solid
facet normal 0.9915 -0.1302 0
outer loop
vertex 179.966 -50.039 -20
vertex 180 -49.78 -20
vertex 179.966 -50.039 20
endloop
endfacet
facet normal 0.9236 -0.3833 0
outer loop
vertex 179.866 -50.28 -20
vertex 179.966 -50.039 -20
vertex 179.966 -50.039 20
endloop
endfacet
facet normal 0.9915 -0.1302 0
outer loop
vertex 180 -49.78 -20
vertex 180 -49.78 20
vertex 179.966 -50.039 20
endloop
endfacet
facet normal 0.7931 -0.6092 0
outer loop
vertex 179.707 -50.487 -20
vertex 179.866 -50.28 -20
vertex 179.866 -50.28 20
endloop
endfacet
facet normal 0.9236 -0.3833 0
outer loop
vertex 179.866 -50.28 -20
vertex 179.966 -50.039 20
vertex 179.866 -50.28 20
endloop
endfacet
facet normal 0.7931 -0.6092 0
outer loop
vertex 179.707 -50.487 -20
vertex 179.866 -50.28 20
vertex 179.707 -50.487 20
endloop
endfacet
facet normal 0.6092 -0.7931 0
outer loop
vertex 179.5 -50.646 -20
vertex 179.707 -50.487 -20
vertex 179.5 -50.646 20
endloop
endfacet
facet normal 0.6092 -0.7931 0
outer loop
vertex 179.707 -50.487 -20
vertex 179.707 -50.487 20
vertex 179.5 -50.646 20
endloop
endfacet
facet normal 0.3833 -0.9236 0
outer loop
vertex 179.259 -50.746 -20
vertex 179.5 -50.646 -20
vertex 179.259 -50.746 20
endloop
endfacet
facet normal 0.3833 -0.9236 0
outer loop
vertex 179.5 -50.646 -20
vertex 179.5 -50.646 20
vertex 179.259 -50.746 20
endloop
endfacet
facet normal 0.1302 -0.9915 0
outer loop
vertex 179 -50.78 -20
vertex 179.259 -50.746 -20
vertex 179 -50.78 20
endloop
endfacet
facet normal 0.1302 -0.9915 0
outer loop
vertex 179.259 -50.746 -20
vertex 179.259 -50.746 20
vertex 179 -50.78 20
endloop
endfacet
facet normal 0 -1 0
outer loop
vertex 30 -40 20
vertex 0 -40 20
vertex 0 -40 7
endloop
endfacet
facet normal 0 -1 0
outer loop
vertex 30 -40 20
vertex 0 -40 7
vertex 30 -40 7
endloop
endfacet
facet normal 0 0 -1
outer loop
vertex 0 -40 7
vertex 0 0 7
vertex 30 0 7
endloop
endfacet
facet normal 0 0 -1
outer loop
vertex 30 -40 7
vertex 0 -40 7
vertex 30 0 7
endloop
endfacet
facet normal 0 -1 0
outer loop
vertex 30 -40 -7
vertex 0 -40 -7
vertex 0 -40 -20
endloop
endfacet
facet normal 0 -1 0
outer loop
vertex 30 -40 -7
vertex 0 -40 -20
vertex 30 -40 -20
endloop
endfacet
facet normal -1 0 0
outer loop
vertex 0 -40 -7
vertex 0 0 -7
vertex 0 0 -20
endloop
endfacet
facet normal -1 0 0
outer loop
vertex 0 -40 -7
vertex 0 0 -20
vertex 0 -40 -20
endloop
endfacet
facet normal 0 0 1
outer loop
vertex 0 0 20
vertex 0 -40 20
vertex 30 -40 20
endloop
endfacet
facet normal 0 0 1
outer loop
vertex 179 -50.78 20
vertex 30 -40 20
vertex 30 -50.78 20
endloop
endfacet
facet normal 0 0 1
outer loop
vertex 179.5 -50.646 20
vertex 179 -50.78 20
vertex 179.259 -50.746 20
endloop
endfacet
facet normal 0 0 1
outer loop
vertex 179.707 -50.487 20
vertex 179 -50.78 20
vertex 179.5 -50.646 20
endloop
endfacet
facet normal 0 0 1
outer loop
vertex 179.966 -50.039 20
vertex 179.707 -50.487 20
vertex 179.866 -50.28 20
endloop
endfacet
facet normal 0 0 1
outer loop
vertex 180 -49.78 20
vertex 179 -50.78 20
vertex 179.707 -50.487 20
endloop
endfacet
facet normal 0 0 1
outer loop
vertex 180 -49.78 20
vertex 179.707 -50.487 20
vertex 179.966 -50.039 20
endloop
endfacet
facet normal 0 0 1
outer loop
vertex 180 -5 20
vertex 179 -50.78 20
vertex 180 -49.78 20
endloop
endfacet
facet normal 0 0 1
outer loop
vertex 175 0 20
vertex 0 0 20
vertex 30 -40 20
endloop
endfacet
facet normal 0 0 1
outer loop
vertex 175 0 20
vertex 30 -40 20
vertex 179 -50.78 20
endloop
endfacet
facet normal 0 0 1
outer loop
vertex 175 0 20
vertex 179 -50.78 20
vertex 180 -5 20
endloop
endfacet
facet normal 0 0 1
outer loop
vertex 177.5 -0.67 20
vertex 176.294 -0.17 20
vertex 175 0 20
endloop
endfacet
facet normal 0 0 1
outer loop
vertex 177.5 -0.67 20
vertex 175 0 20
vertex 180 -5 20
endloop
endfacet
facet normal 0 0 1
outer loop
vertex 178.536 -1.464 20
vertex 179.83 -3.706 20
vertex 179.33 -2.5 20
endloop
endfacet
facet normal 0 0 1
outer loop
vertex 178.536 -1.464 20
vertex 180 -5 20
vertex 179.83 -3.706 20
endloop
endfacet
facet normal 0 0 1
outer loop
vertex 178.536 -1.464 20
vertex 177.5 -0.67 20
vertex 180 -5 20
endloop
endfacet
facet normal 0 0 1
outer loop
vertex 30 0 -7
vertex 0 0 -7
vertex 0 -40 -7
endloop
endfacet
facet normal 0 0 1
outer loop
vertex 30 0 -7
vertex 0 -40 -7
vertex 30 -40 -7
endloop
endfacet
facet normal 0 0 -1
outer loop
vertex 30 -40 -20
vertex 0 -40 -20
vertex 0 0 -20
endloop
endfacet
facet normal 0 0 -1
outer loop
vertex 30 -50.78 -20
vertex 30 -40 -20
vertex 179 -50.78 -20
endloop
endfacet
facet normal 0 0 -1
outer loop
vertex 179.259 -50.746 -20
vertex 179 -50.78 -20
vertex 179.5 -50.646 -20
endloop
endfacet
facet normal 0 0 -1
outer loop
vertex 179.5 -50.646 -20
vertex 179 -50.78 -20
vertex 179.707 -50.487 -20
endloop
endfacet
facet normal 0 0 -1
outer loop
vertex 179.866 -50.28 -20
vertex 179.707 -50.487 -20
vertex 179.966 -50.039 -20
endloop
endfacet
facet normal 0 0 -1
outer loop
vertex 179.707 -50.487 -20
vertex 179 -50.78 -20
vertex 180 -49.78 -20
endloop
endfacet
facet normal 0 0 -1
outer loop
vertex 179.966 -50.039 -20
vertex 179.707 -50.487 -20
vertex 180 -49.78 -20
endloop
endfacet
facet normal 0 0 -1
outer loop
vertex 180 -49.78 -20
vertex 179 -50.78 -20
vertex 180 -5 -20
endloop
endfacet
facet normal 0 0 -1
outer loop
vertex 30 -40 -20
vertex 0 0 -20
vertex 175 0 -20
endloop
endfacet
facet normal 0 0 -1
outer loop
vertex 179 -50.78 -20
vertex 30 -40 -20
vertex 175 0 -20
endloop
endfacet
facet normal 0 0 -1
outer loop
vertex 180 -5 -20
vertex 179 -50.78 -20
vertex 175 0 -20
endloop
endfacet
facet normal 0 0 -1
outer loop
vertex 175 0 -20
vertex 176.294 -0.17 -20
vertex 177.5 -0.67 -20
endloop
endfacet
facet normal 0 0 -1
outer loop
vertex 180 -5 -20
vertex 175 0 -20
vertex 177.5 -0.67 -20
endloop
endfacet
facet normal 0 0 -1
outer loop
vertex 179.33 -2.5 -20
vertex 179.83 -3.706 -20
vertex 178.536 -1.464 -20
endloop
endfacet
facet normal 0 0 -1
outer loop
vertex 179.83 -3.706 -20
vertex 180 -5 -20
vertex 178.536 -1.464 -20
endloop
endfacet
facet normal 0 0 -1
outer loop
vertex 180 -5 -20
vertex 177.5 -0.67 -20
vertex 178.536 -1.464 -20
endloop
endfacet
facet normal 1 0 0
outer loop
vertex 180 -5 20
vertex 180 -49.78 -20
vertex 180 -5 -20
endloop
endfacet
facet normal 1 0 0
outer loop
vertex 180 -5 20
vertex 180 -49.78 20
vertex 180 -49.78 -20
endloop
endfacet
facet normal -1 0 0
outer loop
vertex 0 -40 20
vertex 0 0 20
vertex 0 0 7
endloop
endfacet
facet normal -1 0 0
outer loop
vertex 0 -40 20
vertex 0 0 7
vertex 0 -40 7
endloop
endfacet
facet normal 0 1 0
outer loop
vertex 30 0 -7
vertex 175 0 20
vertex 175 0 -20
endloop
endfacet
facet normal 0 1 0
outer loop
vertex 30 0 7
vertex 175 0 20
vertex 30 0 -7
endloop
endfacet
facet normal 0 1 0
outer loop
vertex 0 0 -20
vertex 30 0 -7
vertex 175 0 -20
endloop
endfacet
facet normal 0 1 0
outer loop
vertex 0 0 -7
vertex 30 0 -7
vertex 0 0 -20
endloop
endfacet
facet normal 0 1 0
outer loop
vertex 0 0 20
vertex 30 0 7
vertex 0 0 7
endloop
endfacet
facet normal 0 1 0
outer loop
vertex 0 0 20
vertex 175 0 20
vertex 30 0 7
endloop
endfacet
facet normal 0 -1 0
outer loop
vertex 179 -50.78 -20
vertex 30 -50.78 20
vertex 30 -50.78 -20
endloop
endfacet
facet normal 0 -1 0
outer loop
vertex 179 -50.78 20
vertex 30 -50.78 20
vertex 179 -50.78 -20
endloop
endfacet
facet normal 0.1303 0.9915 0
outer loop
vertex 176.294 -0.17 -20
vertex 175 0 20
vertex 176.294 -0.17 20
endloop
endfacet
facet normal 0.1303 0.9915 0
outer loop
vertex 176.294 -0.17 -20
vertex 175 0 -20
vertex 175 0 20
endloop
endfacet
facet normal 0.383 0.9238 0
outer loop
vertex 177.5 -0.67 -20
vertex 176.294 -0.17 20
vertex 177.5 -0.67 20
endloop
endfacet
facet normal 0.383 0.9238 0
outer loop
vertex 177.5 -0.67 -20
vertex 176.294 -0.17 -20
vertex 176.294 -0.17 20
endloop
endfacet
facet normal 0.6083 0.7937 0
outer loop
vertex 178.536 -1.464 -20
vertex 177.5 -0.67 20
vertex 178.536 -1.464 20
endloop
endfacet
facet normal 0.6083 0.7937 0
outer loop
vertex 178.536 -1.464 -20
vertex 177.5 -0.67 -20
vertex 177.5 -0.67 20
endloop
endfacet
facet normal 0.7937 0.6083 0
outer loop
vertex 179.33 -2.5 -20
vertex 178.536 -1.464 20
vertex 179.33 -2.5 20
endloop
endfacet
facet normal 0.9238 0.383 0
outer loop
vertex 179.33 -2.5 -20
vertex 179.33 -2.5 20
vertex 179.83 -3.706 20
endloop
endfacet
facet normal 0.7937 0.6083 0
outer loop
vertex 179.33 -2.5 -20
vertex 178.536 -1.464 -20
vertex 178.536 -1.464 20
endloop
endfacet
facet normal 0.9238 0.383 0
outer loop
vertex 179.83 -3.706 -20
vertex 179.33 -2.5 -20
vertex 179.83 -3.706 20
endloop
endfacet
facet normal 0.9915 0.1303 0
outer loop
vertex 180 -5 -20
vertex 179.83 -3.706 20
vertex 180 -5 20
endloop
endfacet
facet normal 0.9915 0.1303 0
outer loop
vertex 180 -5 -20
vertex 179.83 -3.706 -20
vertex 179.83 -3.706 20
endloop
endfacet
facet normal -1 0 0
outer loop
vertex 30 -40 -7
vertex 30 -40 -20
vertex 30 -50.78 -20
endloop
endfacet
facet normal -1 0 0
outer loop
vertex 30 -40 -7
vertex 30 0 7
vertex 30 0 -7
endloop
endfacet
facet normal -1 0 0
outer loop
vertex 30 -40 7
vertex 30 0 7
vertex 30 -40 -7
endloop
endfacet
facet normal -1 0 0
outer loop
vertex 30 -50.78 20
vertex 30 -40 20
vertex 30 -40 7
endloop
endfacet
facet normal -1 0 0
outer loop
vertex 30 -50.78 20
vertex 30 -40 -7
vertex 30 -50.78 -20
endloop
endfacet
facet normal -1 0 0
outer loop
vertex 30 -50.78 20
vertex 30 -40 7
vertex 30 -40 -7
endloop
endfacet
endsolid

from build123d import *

# Parameters (mm, degrees)
EXTRUDE_1_DEPTH     = 20
SKETCH_2_W          = 30
SKETCH_2_H          = 40
CUT_EXTRUDE_1_DEPTH = 7
FILLET_1_R          = 5
FILLET_2_R          = 1


with BuildPart() as part:
    # 스케치1 → 보스-돌출1 (new, symmetric)
    with BuildSketch(Plane.XY):
        Polygon((0, -40), (30, -40), (30, -50.78), (180, -50.78), (180, 0), (0, 0), align=None)
    extrude(amount=EXTRUDE_1_DEPTH, both=True)

    # 스케치2 → 컷-돌출1 (cut, symmetric)
    with BuildSketch(Plane.XY):
        with Locations((15, -20)):
            Rectangle(SKETCH_2_W, SKETCH_2_H)
    extrude(amount=CUT_EXTRUDE_1_DEPTH, both=True, mode=Mode.SUBTRACT)

    # 필렛1
    fillet_1_edges = [part.edges().sort_by_distance(p)[0] for p in [
        (180, 0, 0),
    ]]
    fillet(fillet_1_edges, radius=FILLET_1_R)

    # 필렛2
    fillet_2_edges = [part.edges().sort_by_distance(p)[0] for p in [
        (180, -50.78, 0),
    ]]
    fillet(fillet_2_edges, radius=FILLET_2_R)


solid = part.part
